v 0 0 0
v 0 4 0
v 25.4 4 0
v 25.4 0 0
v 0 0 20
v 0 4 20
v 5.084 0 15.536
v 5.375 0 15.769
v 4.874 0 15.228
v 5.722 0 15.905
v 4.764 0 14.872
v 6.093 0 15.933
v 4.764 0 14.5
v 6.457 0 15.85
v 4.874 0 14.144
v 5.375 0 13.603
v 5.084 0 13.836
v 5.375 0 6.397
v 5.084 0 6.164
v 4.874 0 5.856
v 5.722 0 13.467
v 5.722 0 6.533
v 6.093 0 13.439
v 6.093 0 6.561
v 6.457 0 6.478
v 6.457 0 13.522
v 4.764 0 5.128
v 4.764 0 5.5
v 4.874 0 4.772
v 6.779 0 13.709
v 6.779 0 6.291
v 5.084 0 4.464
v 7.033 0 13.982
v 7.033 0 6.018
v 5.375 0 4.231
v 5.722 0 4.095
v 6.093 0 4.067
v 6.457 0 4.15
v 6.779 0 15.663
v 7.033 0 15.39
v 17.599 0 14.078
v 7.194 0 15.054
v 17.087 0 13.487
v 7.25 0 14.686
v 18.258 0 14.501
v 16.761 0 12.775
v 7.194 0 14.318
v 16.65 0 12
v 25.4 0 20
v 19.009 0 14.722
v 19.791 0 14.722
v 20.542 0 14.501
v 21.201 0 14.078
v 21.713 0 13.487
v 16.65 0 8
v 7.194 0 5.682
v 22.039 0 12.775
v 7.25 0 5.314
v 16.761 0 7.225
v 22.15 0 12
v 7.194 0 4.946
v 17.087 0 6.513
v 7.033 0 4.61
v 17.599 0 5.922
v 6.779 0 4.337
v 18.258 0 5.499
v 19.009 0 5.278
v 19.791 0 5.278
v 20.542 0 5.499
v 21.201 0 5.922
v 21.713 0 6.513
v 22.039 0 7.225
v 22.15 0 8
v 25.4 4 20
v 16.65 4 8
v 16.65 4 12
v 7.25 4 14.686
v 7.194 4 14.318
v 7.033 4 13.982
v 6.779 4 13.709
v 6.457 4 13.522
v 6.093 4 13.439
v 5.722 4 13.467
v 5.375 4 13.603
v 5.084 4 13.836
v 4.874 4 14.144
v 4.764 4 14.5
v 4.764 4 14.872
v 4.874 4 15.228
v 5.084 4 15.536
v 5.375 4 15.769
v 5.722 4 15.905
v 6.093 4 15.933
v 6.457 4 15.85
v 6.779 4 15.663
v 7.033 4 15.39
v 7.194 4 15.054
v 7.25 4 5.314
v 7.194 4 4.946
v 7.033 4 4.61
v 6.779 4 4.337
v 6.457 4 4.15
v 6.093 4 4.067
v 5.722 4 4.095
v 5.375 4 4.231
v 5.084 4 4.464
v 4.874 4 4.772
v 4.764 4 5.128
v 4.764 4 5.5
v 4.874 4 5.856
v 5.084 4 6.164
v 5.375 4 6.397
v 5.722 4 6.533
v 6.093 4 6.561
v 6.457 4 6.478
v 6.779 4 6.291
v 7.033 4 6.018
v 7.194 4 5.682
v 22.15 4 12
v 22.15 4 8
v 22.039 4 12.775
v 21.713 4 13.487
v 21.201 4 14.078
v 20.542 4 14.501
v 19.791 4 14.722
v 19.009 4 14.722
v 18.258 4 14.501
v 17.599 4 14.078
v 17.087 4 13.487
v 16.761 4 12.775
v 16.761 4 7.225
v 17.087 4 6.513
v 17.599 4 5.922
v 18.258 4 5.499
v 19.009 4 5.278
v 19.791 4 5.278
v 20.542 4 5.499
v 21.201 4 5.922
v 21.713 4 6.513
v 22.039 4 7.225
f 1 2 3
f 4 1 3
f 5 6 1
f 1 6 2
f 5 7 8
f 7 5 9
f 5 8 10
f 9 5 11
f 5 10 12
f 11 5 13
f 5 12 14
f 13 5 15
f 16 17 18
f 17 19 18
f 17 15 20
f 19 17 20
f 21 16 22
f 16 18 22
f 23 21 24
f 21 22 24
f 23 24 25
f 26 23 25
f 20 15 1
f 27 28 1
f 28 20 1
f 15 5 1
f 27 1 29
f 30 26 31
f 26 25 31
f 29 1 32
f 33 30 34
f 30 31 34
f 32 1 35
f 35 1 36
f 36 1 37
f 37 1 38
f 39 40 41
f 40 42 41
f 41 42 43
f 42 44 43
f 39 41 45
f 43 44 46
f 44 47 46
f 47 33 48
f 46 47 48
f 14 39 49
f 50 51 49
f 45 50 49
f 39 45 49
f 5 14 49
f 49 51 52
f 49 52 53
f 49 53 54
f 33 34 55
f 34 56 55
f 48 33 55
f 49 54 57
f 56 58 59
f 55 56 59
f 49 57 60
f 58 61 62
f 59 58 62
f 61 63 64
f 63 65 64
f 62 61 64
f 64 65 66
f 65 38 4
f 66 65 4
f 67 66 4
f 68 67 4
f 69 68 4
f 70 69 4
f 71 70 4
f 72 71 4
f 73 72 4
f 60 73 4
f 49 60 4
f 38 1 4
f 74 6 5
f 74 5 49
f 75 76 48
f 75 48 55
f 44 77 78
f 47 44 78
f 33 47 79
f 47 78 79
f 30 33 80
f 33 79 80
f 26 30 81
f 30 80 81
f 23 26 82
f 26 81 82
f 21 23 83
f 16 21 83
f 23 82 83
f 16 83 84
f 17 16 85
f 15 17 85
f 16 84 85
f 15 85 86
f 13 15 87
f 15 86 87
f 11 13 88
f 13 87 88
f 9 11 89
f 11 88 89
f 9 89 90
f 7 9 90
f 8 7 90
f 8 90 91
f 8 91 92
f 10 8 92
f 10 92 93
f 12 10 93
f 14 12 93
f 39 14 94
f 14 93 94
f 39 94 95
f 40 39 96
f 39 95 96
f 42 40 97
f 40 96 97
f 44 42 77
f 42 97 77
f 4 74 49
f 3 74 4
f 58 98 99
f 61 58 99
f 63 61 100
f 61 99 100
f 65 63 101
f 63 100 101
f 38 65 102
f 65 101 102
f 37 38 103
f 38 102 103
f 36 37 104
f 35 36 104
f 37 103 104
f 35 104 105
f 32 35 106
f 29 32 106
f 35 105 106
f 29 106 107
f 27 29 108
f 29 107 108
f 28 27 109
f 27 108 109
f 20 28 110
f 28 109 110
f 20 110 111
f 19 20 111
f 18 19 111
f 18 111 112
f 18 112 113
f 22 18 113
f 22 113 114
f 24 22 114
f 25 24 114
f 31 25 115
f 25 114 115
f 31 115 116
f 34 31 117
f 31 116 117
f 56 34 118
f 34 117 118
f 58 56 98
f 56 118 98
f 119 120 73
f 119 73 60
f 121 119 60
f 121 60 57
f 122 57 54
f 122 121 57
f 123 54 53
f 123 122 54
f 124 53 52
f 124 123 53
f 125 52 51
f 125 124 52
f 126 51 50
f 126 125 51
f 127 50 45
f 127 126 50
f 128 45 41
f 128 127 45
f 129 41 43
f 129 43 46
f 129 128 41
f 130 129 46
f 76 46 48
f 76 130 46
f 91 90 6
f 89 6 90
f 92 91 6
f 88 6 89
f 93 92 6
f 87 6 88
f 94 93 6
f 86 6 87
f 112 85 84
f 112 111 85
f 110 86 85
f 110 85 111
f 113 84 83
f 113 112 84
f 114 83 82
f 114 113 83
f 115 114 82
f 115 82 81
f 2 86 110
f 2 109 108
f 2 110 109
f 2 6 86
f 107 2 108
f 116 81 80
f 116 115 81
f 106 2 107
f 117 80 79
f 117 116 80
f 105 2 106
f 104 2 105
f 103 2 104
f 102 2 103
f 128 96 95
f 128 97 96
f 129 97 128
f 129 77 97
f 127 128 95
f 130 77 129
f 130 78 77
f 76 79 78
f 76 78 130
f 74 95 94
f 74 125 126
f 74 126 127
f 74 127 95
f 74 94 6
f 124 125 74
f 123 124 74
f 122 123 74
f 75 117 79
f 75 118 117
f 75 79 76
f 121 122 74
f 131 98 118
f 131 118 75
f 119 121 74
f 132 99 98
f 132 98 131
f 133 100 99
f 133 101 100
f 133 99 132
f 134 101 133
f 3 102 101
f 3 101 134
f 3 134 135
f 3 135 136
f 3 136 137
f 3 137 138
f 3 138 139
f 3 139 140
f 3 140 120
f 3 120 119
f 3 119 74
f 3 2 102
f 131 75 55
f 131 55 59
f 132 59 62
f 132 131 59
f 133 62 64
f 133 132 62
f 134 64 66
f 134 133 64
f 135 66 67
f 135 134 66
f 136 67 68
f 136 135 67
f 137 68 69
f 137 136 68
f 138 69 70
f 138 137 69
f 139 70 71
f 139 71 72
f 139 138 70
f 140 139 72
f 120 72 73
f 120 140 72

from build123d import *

# Parameters (mm, degrees)
SKETCH1_W           = 25.4
SKETCH1_H           = 20
SKETCH1_R           = 1.25
BOSS_EXTRUDE1_DEPTH = 4


with BuildPart() as part:
    # Sketch1 → Boss-Extrude1 (new body)
    with BuildSketch(Plane(origin=(0, 4, 0), x_dir=(1, 0, 0), z_dir=(0, 1, 0))):
        with Locations((12.7, -10)):
            Rectangle(SKETCH1_W, SKETCH1_H)
        with Locations((6, -14.686)):
            Circle(SKETCH1_R, mode=Mode.SUBTRACT)
        with Locations((6, -5.314)):
            Circle(SKETCH1_R, mode=Mode.SUBTRACT)
        with BuildLine():
            Line((16.65, -12), (16.65, -8))
            ThreePointArc((16.65, -8), (19.4, -5.25), (22.15, -8))
            Line((22.15, -8), (22.15, -12))
            ThreePointArc((22.15, -12), (19.4, -14.75), (16.65, -12))
        make_face(mode=Mode.SUBTRACT)
    extrude(amount=-BOSS_EXTRUDE1_DEPTH)


solid = part.part
